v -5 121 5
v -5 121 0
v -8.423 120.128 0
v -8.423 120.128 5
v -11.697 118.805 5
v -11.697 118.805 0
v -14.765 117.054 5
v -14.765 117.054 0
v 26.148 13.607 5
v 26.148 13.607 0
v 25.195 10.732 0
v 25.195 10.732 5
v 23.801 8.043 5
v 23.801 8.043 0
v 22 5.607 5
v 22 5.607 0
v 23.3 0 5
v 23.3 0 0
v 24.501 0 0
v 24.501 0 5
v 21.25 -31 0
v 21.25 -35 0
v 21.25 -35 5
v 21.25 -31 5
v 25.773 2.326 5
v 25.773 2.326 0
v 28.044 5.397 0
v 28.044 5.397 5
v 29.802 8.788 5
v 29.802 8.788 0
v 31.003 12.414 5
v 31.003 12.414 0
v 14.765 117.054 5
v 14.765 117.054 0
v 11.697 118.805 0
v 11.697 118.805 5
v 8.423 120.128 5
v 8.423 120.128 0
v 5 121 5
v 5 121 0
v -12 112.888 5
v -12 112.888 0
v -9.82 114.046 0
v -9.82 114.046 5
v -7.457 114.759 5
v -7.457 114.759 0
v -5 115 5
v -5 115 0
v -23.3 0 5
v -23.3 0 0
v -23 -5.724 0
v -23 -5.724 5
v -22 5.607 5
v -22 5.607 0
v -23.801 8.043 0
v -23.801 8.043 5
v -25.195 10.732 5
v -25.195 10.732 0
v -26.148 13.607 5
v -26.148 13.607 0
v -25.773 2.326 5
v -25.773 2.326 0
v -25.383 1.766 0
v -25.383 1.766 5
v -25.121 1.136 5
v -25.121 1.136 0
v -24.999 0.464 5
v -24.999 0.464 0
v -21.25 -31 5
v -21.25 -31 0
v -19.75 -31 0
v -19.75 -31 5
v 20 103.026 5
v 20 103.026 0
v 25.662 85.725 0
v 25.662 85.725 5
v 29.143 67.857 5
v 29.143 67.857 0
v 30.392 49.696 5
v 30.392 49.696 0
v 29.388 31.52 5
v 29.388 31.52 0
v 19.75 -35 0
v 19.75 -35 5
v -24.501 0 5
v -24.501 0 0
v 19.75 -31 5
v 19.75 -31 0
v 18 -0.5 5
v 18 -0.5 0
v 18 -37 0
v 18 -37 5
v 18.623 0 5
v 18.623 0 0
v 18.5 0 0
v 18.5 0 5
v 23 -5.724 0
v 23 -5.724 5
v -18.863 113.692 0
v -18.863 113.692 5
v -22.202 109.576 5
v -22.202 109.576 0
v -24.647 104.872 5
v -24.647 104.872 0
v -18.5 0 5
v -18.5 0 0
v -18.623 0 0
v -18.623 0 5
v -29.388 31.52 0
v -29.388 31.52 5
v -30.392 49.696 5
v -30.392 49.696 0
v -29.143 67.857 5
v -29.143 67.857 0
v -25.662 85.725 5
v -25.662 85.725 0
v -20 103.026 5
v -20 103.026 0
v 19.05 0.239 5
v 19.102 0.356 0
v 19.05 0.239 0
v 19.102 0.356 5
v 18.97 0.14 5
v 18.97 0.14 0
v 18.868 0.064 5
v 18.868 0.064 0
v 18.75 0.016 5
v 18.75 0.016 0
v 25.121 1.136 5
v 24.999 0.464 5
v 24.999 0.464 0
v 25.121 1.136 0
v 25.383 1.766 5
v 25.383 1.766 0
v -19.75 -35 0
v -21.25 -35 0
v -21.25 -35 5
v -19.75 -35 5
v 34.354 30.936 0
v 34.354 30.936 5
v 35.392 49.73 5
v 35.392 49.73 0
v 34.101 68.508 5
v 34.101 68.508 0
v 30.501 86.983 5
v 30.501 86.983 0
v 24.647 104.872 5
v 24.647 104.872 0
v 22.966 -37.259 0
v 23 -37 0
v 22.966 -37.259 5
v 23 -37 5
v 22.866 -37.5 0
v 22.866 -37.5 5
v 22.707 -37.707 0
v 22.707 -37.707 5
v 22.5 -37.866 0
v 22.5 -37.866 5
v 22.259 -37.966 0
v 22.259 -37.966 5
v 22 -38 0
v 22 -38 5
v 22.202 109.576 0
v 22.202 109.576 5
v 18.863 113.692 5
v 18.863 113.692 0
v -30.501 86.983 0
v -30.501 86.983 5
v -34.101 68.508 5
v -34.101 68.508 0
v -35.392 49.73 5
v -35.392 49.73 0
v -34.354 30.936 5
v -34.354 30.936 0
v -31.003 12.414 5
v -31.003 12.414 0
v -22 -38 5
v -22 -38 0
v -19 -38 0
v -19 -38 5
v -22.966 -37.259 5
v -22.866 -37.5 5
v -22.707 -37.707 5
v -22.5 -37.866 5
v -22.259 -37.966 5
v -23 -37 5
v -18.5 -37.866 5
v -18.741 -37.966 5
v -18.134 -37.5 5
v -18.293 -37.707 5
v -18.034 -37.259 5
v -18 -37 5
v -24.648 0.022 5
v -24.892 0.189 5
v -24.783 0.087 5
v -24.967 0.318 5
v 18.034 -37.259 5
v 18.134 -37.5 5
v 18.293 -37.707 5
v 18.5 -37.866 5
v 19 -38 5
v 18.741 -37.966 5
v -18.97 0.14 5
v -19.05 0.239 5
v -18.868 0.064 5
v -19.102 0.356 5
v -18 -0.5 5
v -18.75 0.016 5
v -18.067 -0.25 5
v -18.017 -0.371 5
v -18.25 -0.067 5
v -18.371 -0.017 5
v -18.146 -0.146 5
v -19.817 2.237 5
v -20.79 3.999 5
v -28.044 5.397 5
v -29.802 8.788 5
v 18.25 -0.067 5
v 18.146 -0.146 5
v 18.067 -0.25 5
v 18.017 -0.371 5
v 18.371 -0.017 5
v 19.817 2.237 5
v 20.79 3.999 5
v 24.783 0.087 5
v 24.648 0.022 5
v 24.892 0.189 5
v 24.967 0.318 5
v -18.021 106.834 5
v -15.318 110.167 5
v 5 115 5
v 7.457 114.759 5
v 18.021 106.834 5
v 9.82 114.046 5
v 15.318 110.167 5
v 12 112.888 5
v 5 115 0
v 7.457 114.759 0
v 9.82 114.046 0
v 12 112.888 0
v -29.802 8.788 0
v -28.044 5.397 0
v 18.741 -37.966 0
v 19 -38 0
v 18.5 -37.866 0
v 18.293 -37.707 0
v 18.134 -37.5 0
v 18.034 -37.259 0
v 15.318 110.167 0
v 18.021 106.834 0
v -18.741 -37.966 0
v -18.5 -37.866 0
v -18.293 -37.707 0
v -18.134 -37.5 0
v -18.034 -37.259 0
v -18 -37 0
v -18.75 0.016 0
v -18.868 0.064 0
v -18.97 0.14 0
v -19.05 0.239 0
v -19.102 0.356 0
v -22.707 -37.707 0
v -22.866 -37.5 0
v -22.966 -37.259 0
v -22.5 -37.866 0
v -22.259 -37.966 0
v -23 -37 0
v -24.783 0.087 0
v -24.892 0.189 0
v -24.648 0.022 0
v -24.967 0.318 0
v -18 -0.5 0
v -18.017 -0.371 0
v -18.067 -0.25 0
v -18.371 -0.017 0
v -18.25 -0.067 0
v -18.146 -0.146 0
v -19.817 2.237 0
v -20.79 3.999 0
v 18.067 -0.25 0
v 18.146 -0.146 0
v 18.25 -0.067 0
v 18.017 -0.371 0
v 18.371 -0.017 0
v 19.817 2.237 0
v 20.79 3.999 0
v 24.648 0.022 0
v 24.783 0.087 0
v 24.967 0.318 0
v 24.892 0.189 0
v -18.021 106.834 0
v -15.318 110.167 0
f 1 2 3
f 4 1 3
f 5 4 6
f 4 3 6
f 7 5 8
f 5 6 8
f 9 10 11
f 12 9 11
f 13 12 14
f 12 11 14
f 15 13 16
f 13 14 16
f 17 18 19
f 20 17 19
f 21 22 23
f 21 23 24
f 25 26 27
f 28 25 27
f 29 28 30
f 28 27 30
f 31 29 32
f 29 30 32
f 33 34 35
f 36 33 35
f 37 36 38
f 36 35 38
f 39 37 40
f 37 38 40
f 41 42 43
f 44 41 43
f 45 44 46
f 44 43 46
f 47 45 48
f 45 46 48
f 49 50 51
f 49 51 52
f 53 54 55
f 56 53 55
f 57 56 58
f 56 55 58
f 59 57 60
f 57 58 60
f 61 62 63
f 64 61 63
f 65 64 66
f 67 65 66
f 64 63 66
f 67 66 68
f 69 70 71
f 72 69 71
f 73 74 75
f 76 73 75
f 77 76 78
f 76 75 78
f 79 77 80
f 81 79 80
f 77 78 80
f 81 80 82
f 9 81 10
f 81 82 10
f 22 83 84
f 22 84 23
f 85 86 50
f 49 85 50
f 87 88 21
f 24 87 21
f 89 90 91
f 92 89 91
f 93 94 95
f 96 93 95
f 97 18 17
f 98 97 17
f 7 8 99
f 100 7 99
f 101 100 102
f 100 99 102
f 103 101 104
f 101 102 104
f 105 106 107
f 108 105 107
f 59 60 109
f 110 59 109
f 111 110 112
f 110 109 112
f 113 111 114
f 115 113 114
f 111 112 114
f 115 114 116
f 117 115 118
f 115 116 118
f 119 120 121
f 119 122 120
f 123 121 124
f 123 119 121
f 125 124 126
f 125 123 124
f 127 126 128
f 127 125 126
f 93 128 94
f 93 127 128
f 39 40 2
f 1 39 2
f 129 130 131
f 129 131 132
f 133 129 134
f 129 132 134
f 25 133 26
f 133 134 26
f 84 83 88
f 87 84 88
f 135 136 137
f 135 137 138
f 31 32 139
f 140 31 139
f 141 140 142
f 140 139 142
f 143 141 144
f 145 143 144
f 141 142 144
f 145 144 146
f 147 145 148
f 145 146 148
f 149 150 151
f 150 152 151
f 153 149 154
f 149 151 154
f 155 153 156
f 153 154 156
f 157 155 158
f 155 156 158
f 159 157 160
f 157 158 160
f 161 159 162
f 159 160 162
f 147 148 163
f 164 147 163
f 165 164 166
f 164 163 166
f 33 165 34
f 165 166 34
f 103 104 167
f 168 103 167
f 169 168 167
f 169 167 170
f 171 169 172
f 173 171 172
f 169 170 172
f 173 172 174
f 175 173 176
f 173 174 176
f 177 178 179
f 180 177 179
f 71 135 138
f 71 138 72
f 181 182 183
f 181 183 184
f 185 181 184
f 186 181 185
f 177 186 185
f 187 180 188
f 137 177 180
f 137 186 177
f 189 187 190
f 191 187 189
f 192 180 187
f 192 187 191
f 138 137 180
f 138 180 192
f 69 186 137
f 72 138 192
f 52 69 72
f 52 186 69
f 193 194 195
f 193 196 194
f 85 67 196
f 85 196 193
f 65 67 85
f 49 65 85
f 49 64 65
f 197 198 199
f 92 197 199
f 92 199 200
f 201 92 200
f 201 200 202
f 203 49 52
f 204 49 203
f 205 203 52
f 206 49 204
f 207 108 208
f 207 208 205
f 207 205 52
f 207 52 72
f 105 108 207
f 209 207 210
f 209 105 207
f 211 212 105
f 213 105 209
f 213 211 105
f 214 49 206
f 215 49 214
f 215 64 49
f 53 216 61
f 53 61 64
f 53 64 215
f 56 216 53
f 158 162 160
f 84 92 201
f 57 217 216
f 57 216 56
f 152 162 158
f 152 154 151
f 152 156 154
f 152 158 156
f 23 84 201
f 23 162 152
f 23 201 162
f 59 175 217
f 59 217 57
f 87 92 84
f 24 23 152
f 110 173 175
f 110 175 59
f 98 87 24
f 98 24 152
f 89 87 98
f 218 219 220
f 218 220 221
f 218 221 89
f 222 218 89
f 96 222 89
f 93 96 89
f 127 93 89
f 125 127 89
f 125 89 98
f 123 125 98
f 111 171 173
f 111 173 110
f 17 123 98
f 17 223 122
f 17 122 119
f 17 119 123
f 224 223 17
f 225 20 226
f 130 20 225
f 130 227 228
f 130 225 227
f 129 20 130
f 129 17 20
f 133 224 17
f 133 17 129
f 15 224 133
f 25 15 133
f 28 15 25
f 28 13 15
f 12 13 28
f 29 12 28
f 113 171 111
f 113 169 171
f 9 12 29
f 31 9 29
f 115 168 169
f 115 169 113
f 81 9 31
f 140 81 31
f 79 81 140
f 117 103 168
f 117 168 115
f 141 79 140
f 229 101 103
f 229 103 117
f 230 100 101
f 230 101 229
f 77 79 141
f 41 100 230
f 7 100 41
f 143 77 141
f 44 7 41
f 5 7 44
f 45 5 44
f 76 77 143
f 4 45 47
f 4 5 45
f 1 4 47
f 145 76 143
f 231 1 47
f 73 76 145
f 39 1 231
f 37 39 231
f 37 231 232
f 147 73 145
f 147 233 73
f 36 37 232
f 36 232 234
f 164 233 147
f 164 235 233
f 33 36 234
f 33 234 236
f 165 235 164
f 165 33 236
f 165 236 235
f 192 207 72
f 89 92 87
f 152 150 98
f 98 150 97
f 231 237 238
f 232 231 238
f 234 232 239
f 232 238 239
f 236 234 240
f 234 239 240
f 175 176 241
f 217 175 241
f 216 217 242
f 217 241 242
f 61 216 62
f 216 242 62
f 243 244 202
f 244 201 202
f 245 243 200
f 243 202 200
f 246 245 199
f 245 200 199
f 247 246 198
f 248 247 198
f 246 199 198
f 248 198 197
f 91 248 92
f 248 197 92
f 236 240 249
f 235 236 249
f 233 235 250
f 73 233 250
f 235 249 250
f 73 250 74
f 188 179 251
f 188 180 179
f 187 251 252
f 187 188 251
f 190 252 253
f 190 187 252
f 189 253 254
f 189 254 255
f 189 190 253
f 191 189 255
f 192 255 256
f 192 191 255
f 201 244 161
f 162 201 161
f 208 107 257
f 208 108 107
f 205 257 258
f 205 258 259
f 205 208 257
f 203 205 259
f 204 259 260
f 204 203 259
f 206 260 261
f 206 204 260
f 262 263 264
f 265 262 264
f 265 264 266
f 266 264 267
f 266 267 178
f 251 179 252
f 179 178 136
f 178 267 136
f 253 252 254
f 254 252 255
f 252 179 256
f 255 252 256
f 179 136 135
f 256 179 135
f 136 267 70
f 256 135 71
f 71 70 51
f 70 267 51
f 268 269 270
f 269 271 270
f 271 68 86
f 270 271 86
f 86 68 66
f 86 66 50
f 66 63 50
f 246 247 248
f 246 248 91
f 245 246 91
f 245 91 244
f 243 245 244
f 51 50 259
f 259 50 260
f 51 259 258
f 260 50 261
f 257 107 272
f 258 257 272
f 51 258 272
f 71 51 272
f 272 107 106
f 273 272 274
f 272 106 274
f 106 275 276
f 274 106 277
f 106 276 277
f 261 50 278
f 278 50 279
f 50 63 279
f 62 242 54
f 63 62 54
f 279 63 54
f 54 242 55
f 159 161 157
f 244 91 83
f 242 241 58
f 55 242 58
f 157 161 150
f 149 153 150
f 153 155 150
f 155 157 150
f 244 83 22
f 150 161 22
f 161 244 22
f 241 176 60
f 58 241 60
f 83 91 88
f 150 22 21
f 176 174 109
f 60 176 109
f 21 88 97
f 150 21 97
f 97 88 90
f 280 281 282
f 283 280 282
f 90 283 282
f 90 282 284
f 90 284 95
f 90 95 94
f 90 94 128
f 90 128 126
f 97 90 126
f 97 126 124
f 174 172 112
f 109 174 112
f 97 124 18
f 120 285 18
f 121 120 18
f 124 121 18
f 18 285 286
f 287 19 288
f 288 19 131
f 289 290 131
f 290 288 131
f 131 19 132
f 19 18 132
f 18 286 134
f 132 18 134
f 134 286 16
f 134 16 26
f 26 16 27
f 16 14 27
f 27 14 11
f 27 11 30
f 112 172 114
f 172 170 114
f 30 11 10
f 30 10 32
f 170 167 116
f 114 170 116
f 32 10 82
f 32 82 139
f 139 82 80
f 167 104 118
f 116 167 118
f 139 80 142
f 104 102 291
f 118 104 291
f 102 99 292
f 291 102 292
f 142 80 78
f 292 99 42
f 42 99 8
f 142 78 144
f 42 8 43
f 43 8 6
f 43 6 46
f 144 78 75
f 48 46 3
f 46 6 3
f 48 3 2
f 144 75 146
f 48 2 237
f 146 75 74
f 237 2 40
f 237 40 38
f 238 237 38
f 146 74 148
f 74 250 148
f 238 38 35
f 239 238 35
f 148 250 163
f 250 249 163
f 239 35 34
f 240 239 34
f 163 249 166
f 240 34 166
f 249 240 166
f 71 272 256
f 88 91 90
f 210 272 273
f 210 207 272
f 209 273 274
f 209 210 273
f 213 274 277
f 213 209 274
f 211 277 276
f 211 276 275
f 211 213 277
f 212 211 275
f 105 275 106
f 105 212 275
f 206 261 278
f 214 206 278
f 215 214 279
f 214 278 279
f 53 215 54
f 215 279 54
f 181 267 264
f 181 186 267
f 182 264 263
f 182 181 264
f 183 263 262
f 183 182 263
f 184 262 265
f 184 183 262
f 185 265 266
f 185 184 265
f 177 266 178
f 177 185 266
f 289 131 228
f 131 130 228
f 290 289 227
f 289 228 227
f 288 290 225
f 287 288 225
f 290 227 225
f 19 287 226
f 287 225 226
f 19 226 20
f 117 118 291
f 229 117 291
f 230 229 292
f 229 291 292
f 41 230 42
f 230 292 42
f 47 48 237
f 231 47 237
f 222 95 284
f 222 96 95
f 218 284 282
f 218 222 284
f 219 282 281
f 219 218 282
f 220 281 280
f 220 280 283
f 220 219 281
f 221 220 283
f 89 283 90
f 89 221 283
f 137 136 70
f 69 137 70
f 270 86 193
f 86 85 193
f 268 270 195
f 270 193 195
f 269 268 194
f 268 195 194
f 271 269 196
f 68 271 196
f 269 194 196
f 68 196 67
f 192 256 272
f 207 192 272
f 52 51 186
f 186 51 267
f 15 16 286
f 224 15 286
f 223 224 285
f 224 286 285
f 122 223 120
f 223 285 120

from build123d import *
from OCP.BRepFilletAPI import BRepFilletAPI_MakeChamfer

# Parameters (mm, degrees)
SKETCH1_W           = 1.5
SKETCH1_H           = 4
BOSS_EXTRUDE2_DEPTH = 5
FILLET1_R           = 0.5
CHAMFER1_SIZE       = 0.3
CHAMFER1_SIZE2      = 5.724341006
FILLET2_R           = 1


with BuildPart() as part:
    # Sketch1 → Boss-Extrude2 (new body)
    with BuildSketch(Plane.XY):
        with BuildLine():
            Line((-23, 0), (-23, -38))
            Line((-23, -38), (-18, -38))
            Line((-18, -38), (-18, 0))
            Line((-18, 0), (-19, 0))
            ThreePointArc((-19, 0), (-20.184067393, 2.97246837), (-22, 5.606851138))
            ThreePointArc((-22, 5.606851138), (-24.550960709, 9.359484468), (-26.147686675, 13.606851138))
            ThreePointArc((-26.147686675, 13.606851138), (-30.048729273, 58.796026105), (-20, 103.026136974))
            ThreePointArc((-20, 103.026136974), (-16.753739062, 108.568721435), (-12, 112.888491974))
            ThreePointArc((-12, 112.888491974), (-8.655764836, 114.460632304), (-5, 115))
            Line((-5, 115), (0, 115))
            Line((0, 115), (5, 115))
            ThreePointArc((5, 115), (8.655764836, 114.460632304), (12, 112.888491974))
            ThreePointArc((12, 112.888491974), (16.753739062, 108.568721435), (20, 103.026136974))
            ThreePointArc((20, 103.026136974), (30.048729273, 58.796026105), (26.147686675, 13.606851138))
            ThreePointArc((26.147686675, 13.606851138), (24.550960709, 9.359484468), (22, 5.606851138))
            ThreePointArc((22, 5.606851138), (20.184067393, 2.97246837), (19, 0))
            Line((19, 0), (18, 0))
            Line((18, 0), (18, -38))
            Line((18, -38), (23, -38))
            Line((23, -38), (23, 0))
            Line((23, 0), (25, 0))
            ThreePointArc((25, 0), (25.153863701, 1.240298929), (25.773026769, 2.325956595))
            ThreePointArc((25.773026769, 2.325956595), (28.989837998, 7.058100445), (31.003340596, 12.414112692))
            ThreePointArc((31.003340596, 12.414112692), (35.036954168, 59.138972746), (24.646734179, 104.872176375))
            ThreePointArc((24.646734179, 104.872176375), (20.63684435, 111.718561641), (14.764867241, 117.05448635))
            ThreePointArc((14.764867241, 117.05448635), (10.08229677, 119.521890335), (5, 121))
            Line((5, 121), (-5, 121))
            ThreePointArc((-5, 121), (-10.08229677, 119.521890335), (-14.764867241, 117.05448635))
            ThreePointArc((-14.764867241, 117.05448635), (-20.63684435, 111.718561641), (-24.646734179, 104.872176375))
            ThreePointArc((-24.646734179, 104.872176375), (-35.036954168, 59.138972746), (-31.003340596, 12.414112692))
            ThreePointArc((-31.003340596, 12.414112692), (-28.989837998, 7.058100445), (-25.773026769, 2.325956595))
            ThreePointArc((-25.773026769, 2.325956595), (-25.153863701, 1.240298929), (-25, 0))
            Line((-25, 0), (-23, 0))
        make_face()
        with Locations((-20.5, -33)):
            Rectangle(SKETCH1_W, SKETCH1_H, mode=Mode.SUBTRACT)
        with Locations((20.5, -33)):
            Rectangle(SKETCH1_W, SKETCH1_H, mode=Mode.SUBTRACT)
    extrude(amount=BOSS_EXTRUDE2_DEPTH)

    # Fillet1
    fillet1_edges = [part.edges().sort_by_distance(p)[0] for p in [
        (-25, 0, 2.5),
        (25, 0, 2.5),
        (18, 0, 2.5),
        (19, 0, 2.5),
        (-19, 0, 2.5),
        (-18, 0, 2.5),
    ]]
    fillet(fillet1_edges, radius=FILLET1_R)

    # Chamfer1: one chamfer whose edges measure the first distance from different faces: ONE call of the kernel's chamfer builder (chamfer() names one face for all edges)
    chamfer1_edges_1 = [part.edges().sort_by_distance(p)[0] for p in [
        (-23, 0, 2.5),
    ]]
    chamfer1_side_1 = [part.faces().sort_by_distance(p)[0] for p in [
        (-23.750387455, 0, 2.5),
    ]]
    chamfer1_edges_2 = [part.edges().sort_by_distance(p)[0] for p in [
        (23, 0, 2.5),
    ]]
    chamfer1_side_2 = [part.faces().sort_by_distance(p)[0] for p in [
        (23.750387455, 0, 2.5),
    ]]
    chamfer1 = BRepFilletAPI_MakeChamfer(part.part.solid().wrapped)
    for e in chamfer1_edges_1:
        chamfer1.Add(CHAMFER1_SIZE, CHAMFER1_SIZE2, e.wrapped, chamfer1_side_1[0].wrapped)  # the first distance lies on this face
    for e in chamfer1_edges_2:
        chamfer1.Add(CHAMFER1_SIZE, CHAMFER1_SIZE2, e.wrapped, chamfer1_side_2[0].wrapped)  # the first distance lies on this face
    add(Compound.cast(chamfer1.Shape()), mode=Mode.REPLACE)

    # Fillet2
    fillet2_edges = [part.edges().sort_by_distance(p)[0] for p in [
        (-18, -38, 2.5),
        (-23, -38, 2.5),
        (23, -38, 2.5),
        (18, -38, 2.5),
    ]]
    fillet(fillet2_edges, radius=FILLET2_R)


solid = part.part
